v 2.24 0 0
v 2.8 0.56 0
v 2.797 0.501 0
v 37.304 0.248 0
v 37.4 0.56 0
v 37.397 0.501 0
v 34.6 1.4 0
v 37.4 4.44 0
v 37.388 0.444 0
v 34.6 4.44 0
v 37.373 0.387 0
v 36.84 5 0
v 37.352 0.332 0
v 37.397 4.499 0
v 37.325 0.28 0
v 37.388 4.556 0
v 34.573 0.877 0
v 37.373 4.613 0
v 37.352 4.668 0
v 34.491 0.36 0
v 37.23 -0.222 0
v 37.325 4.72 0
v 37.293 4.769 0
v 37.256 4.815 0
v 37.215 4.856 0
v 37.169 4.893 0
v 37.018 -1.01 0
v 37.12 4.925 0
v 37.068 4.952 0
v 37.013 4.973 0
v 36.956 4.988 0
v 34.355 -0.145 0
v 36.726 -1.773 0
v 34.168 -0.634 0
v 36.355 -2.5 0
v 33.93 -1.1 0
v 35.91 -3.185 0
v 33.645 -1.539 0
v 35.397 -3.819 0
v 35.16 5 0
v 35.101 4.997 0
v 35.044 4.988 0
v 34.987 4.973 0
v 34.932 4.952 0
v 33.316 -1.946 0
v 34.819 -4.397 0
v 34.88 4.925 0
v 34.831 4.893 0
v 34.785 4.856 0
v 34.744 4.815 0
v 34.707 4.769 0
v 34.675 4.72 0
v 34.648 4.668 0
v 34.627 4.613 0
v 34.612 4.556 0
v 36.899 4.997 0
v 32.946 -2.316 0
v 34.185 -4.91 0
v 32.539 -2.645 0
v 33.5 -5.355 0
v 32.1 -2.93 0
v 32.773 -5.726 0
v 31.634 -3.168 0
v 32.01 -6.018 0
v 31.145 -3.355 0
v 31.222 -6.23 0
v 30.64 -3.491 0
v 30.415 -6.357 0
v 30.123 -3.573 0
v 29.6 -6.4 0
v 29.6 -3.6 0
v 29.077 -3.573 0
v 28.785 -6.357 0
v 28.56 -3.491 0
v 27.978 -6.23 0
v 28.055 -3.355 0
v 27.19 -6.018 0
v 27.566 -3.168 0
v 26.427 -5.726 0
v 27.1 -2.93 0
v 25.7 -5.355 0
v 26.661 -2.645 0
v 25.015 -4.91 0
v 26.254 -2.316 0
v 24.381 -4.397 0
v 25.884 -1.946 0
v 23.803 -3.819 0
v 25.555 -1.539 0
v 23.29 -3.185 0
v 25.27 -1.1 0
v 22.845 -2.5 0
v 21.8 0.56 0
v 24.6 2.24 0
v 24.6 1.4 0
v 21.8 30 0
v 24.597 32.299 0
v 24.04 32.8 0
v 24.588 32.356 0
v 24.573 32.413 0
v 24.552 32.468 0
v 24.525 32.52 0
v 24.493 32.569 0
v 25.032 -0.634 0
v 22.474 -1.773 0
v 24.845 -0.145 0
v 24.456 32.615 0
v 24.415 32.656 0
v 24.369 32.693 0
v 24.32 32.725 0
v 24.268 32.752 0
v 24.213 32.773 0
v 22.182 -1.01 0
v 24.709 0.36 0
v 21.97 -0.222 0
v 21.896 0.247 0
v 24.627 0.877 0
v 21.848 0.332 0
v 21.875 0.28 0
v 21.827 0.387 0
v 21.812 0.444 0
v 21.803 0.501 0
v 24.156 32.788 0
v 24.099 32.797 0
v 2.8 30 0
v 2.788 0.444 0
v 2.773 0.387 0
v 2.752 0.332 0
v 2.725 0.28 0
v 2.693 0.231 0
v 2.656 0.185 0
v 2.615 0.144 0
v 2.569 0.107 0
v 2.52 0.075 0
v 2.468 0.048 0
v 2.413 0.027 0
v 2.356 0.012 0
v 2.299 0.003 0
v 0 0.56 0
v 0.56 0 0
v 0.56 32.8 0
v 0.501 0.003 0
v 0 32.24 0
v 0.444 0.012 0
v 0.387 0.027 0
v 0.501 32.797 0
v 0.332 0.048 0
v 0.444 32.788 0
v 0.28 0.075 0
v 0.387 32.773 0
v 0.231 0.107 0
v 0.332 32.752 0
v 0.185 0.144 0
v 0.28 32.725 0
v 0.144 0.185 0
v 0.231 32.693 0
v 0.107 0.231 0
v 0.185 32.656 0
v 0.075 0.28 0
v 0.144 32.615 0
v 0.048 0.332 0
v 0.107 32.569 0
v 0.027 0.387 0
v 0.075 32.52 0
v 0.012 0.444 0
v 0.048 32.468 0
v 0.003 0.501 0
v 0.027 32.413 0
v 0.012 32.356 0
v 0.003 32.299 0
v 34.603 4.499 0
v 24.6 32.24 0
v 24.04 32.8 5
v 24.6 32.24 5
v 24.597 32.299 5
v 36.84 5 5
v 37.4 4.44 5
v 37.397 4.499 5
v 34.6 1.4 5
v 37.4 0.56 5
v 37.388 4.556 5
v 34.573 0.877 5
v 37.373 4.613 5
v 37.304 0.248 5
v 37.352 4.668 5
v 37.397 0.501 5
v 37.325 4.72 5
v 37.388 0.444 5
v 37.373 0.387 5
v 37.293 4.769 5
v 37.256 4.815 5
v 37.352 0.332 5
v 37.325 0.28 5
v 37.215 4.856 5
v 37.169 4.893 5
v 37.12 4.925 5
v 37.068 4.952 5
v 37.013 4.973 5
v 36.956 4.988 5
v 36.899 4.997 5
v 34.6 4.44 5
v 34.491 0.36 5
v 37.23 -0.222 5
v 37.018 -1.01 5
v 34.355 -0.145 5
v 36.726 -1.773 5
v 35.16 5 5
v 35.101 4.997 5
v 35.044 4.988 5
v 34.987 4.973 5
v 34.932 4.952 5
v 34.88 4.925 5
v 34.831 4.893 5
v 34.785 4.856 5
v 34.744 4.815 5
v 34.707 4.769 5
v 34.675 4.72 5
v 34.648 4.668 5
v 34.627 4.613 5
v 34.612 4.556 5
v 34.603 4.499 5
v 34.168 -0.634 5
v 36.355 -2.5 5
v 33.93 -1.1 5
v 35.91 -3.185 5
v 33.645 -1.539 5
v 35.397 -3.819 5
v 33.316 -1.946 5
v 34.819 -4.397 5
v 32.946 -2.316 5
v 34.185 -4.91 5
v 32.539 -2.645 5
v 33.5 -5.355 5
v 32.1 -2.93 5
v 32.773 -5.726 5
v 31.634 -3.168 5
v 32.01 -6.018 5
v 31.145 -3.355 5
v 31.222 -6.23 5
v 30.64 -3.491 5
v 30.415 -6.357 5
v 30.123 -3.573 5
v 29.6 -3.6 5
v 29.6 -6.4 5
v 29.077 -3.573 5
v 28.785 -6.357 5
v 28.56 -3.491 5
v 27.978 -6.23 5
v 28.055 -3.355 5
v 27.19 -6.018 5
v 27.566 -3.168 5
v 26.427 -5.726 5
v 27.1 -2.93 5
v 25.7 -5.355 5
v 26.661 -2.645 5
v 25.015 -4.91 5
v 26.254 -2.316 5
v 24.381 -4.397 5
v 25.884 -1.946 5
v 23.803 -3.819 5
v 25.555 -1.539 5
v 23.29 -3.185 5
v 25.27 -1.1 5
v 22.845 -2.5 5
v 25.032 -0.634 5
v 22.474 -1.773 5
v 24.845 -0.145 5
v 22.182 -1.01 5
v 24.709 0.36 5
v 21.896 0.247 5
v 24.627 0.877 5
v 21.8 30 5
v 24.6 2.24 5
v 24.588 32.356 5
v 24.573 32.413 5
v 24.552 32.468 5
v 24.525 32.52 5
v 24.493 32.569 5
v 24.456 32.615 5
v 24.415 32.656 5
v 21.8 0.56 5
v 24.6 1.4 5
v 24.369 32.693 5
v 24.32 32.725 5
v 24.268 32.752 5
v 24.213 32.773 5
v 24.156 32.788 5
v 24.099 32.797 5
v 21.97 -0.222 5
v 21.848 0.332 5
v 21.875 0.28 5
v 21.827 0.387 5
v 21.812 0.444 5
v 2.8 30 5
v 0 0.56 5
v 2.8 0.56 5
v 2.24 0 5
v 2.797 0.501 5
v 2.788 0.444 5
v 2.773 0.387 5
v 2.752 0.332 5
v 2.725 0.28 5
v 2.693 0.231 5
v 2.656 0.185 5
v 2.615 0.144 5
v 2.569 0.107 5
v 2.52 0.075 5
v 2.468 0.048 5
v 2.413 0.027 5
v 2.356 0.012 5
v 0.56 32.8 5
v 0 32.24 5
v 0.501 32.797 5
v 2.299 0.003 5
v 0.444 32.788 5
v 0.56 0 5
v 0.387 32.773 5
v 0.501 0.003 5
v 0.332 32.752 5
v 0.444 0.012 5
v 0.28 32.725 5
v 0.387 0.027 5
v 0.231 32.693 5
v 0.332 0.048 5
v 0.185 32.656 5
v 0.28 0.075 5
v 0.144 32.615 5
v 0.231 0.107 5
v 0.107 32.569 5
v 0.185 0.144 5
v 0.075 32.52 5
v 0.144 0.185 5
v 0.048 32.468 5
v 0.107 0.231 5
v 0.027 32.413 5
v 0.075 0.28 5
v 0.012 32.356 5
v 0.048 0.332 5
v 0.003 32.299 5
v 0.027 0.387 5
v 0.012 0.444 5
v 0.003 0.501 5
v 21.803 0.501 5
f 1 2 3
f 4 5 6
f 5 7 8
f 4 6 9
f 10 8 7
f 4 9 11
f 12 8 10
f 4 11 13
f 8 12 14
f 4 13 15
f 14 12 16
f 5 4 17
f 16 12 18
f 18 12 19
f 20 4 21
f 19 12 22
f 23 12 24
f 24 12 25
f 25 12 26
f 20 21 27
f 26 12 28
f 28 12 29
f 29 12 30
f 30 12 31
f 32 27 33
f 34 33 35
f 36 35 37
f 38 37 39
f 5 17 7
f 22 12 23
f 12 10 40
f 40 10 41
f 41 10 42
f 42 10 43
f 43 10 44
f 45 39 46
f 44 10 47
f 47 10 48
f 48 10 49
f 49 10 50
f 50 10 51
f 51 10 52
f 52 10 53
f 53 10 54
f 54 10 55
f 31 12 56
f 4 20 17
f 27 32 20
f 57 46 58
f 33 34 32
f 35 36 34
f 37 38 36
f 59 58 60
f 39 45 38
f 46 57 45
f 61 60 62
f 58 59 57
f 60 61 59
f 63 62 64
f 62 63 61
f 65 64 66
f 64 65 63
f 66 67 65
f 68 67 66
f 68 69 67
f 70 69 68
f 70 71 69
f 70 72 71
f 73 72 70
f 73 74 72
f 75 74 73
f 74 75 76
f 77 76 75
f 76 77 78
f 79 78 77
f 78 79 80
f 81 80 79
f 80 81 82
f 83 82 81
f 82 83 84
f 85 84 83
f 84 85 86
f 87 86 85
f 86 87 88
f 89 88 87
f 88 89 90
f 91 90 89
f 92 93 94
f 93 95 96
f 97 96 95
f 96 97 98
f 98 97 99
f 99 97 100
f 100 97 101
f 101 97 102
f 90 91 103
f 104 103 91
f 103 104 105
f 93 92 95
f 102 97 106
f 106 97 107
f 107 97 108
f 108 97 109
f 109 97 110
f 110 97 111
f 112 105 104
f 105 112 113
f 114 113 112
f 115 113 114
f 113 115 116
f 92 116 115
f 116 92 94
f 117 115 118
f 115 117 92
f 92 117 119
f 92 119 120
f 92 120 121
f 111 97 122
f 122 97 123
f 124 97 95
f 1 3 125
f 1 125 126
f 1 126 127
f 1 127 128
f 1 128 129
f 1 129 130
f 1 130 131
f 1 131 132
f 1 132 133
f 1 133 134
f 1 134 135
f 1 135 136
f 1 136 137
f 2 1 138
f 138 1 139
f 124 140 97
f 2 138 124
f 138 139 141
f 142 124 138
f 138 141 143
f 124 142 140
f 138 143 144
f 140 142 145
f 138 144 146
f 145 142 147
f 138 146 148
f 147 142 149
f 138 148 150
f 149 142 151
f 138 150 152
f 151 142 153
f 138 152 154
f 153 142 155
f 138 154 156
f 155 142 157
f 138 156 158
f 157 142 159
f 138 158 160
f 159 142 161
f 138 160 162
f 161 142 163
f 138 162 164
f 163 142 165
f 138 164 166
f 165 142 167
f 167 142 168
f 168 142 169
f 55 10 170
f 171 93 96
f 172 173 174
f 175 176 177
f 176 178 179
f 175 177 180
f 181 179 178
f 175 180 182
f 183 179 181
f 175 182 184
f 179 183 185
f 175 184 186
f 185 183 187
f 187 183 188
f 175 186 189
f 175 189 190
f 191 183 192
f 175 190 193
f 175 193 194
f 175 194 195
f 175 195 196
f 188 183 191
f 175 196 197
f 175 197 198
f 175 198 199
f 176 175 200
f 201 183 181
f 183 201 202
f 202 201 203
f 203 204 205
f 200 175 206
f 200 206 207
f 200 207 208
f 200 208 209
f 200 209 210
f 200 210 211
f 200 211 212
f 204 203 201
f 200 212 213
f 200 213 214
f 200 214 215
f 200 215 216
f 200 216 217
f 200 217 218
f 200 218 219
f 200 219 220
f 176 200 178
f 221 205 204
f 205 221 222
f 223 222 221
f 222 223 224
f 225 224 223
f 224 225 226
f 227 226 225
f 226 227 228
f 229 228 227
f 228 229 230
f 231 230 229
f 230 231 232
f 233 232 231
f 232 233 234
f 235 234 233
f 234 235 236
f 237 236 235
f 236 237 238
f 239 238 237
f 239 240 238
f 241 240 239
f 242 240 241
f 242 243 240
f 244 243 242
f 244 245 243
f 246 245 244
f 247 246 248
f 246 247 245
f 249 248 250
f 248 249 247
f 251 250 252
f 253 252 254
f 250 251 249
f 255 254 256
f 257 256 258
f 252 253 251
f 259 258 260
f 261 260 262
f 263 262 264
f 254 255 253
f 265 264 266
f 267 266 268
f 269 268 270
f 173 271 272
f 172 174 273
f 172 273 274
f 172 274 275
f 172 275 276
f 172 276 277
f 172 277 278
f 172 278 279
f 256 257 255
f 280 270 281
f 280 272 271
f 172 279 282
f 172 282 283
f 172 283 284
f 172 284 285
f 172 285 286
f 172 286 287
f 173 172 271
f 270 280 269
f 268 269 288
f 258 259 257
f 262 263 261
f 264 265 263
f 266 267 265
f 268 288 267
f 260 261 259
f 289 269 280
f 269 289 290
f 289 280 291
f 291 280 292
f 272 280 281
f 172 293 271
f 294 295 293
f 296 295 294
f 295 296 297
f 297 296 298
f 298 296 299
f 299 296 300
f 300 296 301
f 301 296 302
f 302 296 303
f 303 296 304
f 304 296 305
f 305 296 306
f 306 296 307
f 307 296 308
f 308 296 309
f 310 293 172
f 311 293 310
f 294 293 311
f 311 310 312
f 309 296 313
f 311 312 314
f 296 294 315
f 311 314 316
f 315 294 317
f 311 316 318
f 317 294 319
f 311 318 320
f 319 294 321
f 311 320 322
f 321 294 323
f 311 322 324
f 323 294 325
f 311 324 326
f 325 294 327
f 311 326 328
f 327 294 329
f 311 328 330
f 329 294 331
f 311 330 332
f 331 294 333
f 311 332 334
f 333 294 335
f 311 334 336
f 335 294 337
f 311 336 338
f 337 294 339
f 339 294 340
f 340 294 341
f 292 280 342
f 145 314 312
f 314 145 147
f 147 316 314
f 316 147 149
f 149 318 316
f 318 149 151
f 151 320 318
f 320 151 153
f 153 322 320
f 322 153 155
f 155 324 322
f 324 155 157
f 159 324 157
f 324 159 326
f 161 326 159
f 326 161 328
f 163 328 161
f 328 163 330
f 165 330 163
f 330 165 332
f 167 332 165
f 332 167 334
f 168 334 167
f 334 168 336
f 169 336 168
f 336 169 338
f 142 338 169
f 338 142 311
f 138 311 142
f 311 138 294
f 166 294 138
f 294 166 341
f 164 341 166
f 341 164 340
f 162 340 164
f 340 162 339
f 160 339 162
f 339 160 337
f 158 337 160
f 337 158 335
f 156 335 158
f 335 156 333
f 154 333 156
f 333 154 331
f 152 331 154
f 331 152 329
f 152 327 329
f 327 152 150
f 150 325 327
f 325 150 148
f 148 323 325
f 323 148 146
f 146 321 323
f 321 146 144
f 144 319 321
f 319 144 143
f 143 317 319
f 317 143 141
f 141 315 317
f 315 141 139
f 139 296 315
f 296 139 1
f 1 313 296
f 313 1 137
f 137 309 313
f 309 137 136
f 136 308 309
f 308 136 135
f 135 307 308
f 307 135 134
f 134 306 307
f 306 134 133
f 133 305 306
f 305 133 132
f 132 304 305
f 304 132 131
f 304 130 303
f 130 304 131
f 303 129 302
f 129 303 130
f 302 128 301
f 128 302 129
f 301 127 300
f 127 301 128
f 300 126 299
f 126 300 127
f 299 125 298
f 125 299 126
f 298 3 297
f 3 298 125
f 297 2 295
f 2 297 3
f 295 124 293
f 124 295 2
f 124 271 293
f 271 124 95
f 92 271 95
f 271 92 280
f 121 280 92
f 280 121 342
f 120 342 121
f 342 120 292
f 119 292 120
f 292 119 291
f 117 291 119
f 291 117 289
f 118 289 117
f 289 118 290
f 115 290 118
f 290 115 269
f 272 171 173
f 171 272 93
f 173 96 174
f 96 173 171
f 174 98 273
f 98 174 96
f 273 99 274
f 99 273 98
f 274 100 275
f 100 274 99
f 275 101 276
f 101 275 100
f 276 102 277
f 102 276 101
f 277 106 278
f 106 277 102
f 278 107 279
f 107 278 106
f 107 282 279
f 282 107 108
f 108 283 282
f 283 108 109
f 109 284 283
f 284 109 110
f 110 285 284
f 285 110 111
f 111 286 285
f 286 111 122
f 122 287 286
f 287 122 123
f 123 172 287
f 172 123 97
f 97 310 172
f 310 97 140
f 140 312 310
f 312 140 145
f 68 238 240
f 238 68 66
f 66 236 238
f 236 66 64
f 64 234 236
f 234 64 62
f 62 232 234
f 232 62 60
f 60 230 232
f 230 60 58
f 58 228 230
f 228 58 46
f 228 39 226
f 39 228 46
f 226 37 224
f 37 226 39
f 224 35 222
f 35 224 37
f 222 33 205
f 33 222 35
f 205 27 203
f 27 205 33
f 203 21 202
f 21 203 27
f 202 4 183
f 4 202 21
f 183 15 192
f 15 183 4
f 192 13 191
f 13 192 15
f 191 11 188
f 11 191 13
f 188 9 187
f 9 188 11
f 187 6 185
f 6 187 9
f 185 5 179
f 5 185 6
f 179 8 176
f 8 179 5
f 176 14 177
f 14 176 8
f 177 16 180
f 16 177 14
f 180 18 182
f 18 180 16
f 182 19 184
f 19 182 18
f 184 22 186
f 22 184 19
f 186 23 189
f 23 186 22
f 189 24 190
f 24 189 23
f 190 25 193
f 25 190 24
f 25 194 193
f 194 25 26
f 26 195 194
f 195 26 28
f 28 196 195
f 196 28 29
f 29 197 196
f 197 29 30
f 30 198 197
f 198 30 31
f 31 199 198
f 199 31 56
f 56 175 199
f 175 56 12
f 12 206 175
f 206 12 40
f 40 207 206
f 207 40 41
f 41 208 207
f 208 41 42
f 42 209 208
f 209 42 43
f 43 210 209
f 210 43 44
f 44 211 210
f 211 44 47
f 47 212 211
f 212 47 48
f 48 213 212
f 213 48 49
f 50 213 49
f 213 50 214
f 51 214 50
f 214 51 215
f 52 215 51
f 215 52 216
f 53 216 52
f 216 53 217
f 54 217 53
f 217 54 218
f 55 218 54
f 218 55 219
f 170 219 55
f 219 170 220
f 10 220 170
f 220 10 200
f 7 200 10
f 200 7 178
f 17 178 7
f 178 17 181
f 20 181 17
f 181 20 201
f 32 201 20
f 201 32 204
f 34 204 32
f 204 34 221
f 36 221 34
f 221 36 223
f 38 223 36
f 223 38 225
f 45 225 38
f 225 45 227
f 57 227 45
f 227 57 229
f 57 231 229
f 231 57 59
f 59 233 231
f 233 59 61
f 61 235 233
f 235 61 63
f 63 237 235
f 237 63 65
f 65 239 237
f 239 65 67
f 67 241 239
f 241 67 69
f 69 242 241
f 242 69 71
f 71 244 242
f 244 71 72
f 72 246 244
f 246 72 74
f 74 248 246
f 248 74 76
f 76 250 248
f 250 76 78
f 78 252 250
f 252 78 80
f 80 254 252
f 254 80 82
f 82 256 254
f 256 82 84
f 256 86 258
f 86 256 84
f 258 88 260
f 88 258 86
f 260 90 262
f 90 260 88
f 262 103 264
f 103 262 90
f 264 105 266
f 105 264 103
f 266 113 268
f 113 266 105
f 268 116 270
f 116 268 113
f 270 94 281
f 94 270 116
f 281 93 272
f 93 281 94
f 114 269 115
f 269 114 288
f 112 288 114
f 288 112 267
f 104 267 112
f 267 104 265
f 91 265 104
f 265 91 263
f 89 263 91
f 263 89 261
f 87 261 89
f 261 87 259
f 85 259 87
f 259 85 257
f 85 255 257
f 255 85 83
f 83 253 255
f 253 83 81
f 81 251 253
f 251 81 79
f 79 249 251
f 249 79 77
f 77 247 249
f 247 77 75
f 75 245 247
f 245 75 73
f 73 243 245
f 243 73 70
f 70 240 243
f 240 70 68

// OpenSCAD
use <hook.scad>

$fn=60;// Render 'scale'
// Measurements assumed as mm

// Internal measurement: bottom of 'leg' to top of arch (also called the loop).
LOOP_HEIGHT=30; // Guestimate 30mm as nice
// Internal measurement: distance between legs desk is 31
// Add an extra 1mm for clearance.
LOOP_WIDTH=19; // 18mm was too small by about a mm on our cupboards.

////
// Hook (the bit used to hang things on) options:
////

// Rounded or square profiled hook
HOOK_TYPE="rounded";//[rounded,square,none]
HOOK_DEPTH=10; // Guestimate
HOOK_HEIGHT=5; // Guestimate

// Print height from bed
PRINT_HEIGHT=5;//Guestimate
// Horizontal thickness of 2d shape
PLA_WIDTH=2.8;//[2:5]

// Whether or not to have nobbles - may only work with no_hook
NOBBLE=false;//[true,false]

// Whether or not to have holes
HOLES=false;//[true,false]


hanger(
    print_height=PRINT_HEIGHT,
    pla_width=PLA_WIDTH,
    loop_height=LOOP_HEIGHT, loop_width=LOOP_WIDTH,
    hook_type=HOOK_TYPE, hook_depth=HOOK_DEPTH, hook_height=HOOK_HEIGHT,
    holes=HOLES, 
    nobble=NOBBLE);
